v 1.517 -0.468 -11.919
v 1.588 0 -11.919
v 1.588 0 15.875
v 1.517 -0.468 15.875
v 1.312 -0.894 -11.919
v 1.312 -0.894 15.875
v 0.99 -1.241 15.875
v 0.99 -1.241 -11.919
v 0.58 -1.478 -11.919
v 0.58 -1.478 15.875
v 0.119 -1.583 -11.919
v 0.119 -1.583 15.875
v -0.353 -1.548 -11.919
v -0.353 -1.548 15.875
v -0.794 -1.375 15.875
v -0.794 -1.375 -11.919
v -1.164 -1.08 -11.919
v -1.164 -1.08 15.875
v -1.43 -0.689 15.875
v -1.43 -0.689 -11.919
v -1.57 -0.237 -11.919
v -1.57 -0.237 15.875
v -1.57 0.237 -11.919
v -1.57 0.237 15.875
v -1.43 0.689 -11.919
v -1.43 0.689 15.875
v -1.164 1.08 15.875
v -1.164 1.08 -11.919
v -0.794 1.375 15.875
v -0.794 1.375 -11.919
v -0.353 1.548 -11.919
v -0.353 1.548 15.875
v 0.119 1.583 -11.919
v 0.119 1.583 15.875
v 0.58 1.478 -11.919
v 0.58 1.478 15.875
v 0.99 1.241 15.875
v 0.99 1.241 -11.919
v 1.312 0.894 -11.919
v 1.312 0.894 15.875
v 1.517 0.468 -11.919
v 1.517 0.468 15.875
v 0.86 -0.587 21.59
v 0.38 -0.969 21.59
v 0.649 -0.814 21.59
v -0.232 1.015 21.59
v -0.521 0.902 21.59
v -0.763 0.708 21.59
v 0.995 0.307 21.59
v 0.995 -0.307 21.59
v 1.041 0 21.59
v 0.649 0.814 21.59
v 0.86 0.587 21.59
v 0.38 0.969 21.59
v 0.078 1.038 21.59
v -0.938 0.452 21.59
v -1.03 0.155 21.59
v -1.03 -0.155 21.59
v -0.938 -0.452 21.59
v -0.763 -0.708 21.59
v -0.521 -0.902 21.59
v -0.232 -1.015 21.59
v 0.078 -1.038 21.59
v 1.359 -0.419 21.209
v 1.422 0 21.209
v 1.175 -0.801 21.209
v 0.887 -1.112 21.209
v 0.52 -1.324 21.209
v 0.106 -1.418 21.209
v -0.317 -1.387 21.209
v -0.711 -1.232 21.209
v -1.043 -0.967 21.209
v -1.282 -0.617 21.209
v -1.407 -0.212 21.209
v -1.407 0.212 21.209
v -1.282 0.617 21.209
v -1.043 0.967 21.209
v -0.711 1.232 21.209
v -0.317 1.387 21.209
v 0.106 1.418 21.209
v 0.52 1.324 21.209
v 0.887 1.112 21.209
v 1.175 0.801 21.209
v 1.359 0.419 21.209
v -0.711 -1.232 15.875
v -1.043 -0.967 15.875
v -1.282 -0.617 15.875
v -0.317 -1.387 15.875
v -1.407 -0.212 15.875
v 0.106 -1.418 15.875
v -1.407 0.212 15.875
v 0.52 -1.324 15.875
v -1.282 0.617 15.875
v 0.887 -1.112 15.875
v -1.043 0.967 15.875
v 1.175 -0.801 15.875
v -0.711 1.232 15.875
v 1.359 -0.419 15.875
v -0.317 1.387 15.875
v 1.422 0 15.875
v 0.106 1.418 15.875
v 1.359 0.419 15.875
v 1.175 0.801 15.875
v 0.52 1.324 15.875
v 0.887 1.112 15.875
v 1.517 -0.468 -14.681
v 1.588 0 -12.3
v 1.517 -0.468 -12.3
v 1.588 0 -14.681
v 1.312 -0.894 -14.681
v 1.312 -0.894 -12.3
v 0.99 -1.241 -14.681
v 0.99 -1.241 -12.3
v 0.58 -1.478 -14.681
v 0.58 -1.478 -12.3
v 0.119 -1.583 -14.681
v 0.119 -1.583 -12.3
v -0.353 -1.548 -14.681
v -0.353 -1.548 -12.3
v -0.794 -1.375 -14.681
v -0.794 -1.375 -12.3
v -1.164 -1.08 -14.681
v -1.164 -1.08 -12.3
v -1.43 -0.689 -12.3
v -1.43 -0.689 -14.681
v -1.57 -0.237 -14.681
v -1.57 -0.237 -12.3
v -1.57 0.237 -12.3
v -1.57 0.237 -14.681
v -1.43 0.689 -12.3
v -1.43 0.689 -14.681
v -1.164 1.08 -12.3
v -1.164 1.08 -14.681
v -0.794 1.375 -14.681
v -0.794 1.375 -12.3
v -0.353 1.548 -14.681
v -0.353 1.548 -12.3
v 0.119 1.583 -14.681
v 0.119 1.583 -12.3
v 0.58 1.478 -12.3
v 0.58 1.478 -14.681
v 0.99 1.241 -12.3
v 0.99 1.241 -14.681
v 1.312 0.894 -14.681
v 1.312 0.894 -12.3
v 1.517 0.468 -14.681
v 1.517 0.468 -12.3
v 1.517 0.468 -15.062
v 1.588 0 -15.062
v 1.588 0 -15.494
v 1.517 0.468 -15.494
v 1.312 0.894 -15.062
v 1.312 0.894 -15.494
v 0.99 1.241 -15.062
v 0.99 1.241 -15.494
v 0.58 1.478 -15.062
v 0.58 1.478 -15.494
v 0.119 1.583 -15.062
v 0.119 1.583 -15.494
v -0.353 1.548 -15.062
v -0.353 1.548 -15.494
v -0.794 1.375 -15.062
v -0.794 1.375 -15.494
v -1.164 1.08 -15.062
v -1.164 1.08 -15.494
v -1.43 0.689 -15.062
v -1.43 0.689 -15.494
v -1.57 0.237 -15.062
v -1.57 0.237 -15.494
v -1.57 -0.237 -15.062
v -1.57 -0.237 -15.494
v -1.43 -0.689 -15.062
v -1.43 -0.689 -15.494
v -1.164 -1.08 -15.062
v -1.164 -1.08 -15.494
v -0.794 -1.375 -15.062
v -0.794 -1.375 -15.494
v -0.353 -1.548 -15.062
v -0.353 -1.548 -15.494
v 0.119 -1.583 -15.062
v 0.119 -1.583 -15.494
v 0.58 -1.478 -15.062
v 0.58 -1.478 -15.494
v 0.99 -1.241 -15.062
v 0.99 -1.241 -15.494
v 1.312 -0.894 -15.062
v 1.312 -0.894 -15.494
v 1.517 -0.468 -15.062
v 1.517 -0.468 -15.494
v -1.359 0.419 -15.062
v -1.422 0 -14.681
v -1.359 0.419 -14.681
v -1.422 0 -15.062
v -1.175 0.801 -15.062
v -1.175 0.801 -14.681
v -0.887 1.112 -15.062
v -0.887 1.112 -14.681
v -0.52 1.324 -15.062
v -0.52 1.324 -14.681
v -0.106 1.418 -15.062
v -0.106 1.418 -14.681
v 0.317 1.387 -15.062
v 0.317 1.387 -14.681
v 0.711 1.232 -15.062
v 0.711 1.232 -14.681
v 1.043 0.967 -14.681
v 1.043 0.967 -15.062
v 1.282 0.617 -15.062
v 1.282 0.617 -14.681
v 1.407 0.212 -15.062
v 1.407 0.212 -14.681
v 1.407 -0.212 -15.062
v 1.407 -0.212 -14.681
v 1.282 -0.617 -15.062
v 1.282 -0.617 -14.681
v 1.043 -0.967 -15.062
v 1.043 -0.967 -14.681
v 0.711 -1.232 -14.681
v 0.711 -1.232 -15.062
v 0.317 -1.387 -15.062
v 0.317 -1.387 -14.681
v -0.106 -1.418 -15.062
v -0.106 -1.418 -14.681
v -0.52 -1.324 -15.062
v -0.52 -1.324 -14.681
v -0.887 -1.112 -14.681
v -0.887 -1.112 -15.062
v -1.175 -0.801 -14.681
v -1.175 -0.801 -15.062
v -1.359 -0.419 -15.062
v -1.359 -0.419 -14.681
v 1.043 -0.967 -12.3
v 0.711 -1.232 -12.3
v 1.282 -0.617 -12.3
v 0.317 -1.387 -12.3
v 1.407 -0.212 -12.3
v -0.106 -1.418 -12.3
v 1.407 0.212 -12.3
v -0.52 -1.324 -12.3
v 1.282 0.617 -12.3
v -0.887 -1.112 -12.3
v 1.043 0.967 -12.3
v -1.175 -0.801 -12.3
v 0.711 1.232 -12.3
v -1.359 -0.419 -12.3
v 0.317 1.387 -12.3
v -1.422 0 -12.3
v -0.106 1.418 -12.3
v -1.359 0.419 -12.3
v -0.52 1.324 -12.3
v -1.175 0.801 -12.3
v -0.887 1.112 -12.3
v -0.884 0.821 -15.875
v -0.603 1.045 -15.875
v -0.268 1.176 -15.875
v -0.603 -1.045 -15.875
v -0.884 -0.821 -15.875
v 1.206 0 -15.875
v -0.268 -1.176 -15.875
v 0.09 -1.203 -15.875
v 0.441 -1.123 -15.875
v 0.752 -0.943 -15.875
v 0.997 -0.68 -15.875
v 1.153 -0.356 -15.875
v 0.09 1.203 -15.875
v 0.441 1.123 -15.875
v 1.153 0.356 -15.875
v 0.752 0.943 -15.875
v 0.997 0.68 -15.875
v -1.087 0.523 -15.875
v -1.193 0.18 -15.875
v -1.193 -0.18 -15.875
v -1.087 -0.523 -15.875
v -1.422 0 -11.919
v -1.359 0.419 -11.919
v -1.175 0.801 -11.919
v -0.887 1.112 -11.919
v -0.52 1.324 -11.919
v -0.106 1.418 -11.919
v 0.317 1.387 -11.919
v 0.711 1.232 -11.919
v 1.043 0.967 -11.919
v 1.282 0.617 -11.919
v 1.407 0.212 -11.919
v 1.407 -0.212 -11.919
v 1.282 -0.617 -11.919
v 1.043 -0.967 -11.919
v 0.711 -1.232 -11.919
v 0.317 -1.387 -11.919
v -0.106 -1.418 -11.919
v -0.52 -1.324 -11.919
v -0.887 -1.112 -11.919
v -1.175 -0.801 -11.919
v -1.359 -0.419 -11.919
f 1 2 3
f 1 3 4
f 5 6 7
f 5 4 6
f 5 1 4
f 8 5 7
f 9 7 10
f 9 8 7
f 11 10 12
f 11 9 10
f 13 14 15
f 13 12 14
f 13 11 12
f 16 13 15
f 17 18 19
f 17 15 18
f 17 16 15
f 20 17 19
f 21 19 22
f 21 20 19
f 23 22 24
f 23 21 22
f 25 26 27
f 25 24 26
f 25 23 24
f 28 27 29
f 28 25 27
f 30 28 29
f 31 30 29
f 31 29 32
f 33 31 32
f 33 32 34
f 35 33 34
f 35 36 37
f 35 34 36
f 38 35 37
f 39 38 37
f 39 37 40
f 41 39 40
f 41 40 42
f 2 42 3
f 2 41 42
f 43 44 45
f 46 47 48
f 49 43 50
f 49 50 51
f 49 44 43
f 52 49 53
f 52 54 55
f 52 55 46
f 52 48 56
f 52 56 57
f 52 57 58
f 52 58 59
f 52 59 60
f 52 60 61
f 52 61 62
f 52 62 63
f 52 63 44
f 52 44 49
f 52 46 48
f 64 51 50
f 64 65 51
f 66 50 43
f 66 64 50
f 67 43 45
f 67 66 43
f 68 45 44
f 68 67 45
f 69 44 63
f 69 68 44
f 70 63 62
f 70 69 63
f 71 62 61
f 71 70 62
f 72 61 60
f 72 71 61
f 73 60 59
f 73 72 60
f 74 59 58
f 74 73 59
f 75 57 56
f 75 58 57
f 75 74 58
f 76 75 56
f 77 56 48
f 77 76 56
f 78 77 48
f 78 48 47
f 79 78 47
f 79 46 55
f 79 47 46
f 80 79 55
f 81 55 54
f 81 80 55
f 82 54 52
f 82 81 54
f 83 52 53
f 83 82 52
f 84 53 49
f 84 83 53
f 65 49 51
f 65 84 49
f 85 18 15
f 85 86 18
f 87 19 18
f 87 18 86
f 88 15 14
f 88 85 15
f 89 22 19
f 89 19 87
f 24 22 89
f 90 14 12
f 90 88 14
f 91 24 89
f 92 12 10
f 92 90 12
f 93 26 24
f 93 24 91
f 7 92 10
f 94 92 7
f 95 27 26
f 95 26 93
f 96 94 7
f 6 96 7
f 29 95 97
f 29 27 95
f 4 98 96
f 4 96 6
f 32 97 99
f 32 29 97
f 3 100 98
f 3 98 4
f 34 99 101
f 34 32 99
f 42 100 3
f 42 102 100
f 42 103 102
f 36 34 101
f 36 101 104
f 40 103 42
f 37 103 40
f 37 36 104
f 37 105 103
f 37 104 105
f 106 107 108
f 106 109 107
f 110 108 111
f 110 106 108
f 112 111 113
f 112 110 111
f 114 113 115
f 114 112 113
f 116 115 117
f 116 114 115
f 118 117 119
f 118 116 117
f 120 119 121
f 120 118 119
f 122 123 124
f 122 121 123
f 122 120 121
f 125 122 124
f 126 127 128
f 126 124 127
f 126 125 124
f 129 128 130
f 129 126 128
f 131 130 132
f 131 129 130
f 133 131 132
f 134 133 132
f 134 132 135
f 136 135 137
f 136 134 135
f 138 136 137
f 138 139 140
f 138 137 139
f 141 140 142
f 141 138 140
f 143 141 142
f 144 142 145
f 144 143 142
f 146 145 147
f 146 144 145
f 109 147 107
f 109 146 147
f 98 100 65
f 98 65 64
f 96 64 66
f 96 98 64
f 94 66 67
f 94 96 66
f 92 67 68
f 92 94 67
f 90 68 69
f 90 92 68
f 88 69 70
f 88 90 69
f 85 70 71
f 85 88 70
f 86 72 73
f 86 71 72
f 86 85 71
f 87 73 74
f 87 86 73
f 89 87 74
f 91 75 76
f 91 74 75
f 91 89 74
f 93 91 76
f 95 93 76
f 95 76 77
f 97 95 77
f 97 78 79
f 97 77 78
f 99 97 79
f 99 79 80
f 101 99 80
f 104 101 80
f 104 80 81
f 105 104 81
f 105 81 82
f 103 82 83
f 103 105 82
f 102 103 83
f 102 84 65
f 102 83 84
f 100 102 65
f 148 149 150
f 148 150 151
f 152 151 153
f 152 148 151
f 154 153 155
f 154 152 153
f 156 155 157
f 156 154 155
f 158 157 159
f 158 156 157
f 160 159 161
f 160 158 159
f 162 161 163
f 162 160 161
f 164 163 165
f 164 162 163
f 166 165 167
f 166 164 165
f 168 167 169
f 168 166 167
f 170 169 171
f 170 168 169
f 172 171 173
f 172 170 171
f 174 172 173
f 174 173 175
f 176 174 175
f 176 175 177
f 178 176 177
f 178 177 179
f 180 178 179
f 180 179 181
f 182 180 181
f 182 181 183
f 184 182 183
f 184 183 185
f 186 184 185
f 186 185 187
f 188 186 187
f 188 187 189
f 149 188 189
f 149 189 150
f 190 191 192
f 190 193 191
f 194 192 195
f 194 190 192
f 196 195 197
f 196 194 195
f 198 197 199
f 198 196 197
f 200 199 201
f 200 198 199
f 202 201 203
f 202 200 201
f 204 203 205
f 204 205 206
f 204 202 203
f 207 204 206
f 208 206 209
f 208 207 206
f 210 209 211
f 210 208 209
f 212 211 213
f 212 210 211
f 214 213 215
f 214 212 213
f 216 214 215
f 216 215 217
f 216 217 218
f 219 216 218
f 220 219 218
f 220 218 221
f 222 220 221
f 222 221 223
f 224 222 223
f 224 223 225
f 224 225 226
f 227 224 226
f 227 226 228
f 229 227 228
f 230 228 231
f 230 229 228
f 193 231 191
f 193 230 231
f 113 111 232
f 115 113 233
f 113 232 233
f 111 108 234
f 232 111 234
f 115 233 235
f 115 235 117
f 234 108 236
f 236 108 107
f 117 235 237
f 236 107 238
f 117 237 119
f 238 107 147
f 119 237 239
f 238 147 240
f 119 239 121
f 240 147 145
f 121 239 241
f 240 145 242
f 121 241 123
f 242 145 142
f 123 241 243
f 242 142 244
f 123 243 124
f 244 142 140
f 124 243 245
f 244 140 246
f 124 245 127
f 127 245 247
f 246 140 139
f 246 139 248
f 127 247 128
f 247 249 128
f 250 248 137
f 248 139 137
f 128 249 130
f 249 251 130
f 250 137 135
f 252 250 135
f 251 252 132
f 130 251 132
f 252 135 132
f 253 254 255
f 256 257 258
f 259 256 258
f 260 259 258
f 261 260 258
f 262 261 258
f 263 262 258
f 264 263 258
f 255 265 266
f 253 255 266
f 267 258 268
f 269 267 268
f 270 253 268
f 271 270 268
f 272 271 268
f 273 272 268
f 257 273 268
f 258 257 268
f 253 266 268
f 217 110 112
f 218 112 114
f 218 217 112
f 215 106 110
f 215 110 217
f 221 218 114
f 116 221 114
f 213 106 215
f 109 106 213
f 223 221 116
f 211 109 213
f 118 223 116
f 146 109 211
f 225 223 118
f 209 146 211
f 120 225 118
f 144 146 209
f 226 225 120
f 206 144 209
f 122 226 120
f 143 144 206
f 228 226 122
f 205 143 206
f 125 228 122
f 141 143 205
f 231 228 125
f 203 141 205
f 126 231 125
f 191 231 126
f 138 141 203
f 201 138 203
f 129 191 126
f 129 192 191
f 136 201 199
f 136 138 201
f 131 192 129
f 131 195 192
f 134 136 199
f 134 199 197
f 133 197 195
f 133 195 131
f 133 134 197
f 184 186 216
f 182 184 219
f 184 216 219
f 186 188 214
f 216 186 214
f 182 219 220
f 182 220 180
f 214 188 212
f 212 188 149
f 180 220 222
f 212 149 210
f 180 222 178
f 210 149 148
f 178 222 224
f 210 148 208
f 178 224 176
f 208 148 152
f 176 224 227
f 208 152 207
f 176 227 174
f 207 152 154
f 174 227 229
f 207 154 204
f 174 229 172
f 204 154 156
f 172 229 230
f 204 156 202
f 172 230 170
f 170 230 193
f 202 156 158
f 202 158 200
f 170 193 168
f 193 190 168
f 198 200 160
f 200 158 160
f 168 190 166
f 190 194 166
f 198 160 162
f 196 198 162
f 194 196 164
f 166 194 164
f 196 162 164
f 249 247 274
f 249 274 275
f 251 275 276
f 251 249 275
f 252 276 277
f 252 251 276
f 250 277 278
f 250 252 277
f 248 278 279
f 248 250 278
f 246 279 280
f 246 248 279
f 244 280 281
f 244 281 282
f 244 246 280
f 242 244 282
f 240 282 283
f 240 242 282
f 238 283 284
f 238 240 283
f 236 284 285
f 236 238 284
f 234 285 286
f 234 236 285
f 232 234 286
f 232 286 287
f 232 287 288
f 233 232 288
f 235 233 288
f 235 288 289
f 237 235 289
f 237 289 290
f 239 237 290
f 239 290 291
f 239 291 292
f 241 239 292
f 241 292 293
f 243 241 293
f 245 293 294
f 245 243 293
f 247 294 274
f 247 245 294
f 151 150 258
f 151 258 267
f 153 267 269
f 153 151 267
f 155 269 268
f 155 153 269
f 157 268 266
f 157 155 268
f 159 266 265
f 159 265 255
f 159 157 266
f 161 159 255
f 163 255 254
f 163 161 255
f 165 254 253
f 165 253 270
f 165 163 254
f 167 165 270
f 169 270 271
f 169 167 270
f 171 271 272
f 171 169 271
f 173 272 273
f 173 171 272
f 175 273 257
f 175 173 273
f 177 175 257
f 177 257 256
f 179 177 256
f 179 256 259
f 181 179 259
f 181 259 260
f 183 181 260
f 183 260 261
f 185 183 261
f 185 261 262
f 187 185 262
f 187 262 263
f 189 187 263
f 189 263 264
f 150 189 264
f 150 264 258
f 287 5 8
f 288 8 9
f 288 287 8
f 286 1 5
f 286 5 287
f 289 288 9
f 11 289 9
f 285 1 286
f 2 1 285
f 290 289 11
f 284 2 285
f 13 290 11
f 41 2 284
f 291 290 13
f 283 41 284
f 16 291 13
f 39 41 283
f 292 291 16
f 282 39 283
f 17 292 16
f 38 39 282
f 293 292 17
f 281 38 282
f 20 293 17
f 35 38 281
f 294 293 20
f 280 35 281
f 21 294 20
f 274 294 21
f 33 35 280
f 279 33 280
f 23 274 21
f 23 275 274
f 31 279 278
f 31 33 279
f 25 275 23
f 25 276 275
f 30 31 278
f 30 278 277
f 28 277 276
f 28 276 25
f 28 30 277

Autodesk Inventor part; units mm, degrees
ref_plane "YZ Plane" through (0, 0, 0) normal (1, 0, 0) x (0, 1, 0)
sketch "Sketch1" plane through (0, 0, 0) normal (0, 0, 1) x (1, 0, 0)
  circle A0 centre (0, 0) radius 1.5875
  dimension "d0" = 3.175
extrude "Extrusion1" add sketch "Sketch1" along normal mid plane 31.75
sketch "Sketch2" plane through (0, 0, 15.875) normal (0, 0, 1) x (1, 0, 0)
  circle A0 centre (0, 0) radius 1.4224
  dimension "d3" = 2.8448
extrude "Extrusion2" add sketch "Sketch2" along normal blind 5.715
ref_plane "Work Plane1" through (0, 0, -15.0622) normal (0, 0, -1) x (-1, 0, 0)
sketch "Sketch3" plane through (0, 0, -15.0622) normal (0, 0, -1) x (-1, 0, 0)
  circle A0 centre (0, 0) radius 1.4224 projected
  circle A1 centre (0, 0) radius 1.5875 projected
extrude "Extrusion3" cut sketch "Sketch3" against normal blind 0.381
ref_plane "Work Plane2" through (0, 0, -12.3) normal (0, 0, -1) x (-1, 0, 0)
sketch "Sketch4" plane through (0, 0, -12.3) normal (0, 0, -1) x (-1, 0, 0)
  circle A0 centre (0, 0) radius 1.4224 projected
  circle A1 centre (0, 0) radius 1.5875 projected
extrude "Extrusion4" cut sketch "Sketch4" against normal blind 0.381
chamfer "Chamfer1" distance 0.381 angle 45 2 edges at (-1.5875, 0, -15.875) (-1.4224, 0, 21.59)
thread "Thread1" size "4-40 UNC" class "2A" standard "ANSI Unified Screw Threads" full length
properties part number "Shock Shaft"
